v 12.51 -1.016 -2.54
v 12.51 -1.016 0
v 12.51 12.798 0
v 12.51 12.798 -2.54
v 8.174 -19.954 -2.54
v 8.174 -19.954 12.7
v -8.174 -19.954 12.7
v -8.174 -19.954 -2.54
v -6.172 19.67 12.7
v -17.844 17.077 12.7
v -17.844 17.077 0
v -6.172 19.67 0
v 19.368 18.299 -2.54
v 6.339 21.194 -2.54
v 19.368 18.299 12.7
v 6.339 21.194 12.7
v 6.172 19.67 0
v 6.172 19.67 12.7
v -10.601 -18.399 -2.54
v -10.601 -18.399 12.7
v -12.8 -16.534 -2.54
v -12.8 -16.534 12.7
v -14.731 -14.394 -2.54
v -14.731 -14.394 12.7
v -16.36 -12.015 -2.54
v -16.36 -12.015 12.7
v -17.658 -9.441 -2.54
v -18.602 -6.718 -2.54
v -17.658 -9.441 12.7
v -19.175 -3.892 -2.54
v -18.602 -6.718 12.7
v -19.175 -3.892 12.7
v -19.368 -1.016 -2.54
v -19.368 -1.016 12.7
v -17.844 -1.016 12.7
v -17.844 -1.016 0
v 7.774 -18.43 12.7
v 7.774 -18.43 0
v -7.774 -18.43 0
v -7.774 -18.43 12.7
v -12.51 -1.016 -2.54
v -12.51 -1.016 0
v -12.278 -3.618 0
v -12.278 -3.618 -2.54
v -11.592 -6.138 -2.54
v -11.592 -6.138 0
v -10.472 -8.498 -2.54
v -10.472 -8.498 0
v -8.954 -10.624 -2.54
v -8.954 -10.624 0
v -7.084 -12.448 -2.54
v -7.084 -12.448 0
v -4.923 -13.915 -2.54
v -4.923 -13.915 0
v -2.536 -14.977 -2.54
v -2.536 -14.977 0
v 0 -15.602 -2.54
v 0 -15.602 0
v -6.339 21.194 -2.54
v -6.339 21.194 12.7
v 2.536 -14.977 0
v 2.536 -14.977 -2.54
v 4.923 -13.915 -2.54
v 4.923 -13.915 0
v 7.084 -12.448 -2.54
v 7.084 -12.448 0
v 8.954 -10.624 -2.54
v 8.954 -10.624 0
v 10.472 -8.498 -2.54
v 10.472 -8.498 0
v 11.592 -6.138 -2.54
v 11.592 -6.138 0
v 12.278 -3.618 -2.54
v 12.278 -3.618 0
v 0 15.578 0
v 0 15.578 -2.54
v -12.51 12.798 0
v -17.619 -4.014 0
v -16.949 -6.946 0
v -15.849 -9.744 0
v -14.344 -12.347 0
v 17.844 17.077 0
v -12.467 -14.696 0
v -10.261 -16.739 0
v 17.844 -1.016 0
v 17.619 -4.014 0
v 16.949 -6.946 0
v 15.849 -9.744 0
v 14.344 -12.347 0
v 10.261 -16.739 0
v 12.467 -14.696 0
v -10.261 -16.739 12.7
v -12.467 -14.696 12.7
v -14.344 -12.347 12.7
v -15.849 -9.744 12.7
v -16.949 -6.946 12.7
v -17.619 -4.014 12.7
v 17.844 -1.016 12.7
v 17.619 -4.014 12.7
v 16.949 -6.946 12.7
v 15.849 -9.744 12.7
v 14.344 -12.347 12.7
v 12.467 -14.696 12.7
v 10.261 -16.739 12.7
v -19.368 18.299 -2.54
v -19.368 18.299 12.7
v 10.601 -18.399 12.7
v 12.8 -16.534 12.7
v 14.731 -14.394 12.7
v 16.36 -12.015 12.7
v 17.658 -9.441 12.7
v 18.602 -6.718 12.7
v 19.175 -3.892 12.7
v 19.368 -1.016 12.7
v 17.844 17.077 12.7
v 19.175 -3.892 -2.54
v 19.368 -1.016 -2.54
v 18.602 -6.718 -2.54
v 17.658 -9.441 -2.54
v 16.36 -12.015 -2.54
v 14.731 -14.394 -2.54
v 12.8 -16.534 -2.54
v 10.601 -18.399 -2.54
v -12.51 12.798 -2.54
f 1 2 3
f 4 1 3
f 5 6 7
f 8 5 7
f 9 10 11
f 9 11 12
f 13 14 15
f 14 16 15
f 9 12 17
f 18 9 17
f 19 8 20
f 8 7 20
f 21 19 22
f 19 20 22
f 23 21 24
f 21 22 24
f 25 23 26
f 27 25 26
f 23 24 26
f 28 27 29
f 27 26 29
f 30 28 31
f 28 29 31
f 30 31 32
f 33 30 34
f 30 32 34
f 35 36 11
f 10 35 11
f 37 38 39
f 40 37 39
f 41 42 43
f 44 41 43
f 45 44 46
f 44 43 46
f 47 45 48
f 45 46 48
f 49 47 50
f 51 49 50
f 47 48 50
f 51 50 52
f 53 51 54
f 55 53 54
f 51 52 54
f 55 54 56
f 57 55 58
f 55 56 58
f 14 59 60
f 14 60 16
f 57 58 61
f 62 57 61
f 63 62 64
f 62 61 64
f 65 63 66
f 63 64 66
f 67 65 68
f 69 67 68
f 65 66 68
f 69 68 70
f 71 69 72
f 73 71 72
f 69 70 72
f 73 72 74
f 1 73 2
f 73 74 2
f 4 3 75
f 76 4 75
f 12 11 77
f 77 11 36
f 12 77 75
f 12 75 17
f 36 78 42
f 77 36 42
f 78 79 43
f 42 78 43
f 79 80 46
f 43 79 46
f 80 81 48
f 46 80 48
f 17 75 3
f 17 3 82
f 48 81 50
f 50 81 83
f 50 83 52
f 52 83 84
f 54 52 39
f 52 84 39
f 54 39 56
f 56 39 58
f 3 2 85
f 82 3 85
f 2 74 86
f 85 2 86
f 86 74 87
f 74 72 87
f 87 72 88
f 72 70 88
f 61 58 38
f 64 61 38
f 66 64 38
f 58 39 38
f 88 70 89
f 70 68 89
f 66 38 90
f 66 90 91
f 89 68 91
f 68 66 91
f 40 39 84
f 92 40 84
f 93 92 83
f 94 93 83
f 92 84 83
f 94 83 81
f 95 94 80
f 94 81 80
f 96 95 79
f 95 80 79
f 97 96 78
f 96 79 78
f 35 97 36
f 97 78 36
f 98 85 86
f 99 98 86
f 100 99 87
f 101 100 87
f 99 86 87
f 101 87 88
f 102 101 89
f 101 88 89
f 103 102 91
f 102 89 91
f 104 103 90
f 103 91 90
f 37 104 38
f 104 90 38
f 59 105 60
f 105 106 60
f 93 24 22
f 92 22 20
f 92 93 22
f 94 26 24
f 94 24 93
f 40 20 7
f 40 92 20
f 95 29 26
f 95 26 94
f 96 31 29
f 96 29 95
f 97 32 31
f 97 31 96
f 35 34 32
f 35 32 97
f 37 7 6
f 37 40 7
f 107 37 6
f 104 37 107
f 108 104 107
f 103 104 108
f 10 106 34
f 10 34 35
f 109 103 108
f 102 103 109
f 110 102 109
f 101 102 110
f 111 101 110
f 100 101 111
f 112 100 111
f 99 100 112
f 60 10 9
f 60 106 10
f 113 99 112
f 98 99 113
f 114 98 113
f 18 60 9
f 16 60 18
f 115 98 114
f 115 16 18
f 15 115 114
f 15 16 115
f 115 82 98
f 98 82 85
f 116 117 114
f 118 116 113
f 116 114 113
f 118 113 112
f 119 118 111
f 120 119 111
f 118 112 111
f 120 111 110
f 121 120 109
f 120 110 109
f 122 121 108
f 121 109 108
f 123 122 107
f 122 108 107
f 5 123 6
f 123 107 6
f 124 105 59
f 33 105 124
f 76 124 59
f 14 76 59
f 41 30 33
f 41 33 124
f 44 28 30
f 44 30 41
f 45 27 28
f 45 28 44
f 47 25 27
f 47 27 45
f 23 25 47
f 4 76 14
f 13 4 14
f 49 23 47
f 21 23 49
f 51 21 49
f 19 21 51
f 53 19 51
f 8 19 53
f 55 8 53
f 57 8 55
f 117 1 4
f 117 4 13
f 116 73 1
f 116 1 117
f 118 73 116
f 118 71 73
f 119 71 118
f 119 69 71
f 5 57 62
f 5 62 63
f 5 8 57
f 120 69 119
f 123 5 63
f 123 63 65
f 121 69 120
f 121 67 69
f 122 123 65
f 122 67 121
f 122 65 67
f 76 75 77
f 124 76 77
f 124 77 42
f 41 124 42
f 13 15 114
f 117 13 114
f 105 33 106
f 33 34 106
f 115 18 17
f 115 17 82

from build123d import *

# Parameters (mm, degrees)
F2_DEPTH = 12.7
F4_DEPTH = 2.54
F5_DEPTH = 25.4


with BuildPart() as f2:
    # F1 (on Top) → F2 (new body)
    with BuildSketch(Plane.XY):
        with BuildLine():
            Line((6.339406, 21.194164), (-6.339406, 21.194164))
            Line((-6.339406, 21.194164), (-19.3675, 18.299032))
            Line((-19.3675, 18.299032), (-19.3675, -1.016))
            ThreePointArc((-19.3675, -1.016), (-16.359844, -12.015319), (-8.173823, -19.953836))
            Line((-8.173823, -19.953836), (8.173823, -19.953836))
            ThreePointArc((8.173823, -19.953836), (16.359844, -12.015319), (19.3675, -1.016))
            Line((19.3675, -1.016), (19.3675, 18.299032))
            Line((19.3675, 18.299032), (6.339406, 21.194164))
        make_face()
        with BuildLine():
            Line((7.774487, -18.429836), (-7.774487, -18.429836))
            ThreePointArc((-7.774487, -18.429836), (-15.145045, -11.073668), (-17.8435, -1.016))
            Line((-17.8435, -1.016), (-17.8435, 17.076522))
            Line((-17.8435, 17.076522), (-6.172113, 19.670164))
            Line((-6.172113, 19.670164), (6.172113, 19.670164))
            Line((6.172113, 19.670164), (17.8435, 17.076522))
            Line((17.8435, 17.076522), (17.8435, -1.016))
            ThreePointArc((17.8435, -1.016), (15.145045, -11.073668), (7.774487, -18.429836))
        make_face(mode=Mode.SUBTRACT)
    extrude(amount=F2_DEPTH)

    # F3 (on face) → F4 (join)
    with BuildSketch(Plane(origin=(0, 0, 0), x_dir=(1, 0, 0), z_dir=(0, 0, -1))):
        with BuildLine():
            Line((8.173823, 19.953836), (-8.173823, 19.953836))
            ThreePointArc((-8.173823, 19.953836), (-16.359844, 12.015319), (-19.3675, 1.016))
            Line((-19.3675, 1.016), (-19.3675, -18.299032))
            Line((-19.3675, -18.299032), (-6.339406, -21.194164))
            Line((-6.339406, -21.194164), (6.339406, -21.194164))
            Line((6.339406, -21.194164), (19.3675, -18.299032))
            Line((19.3675, -18.299032), (19.3675, 1.016))
            ThreePointArc((19.3675, 1.016), (16.359844, 12.015319), (8.173823, 19.953836))
        make_face()
    extrude(amount=F4_DEPTH)

    # F1 (on Top) → F5 (cut)
    with BuildSketch(Plane.XY):
        with BuildLine():
            Line((12.5095, 12.797739), (0, 15.577628))
            Line((0, 15.577628), (-12.5095, 12.797739))
            Line((-12.5095, 12.797739), (-12.5095, -1.016))
            ThreePointArc((-12.5095, -1.016), (-8.953801, -10.623903), (0, -15.60228))
            ThreePointArc((0, -15.60228), (8.953801, -10.623903), (12.5095, -1.016))
            Line((12.5095, -1.016), (12.5095, 12.797739))
        make_face()
    extrude(amount=-F5_DEPTH, mode=Mode.SUBTRACT)


solid = f2.part
